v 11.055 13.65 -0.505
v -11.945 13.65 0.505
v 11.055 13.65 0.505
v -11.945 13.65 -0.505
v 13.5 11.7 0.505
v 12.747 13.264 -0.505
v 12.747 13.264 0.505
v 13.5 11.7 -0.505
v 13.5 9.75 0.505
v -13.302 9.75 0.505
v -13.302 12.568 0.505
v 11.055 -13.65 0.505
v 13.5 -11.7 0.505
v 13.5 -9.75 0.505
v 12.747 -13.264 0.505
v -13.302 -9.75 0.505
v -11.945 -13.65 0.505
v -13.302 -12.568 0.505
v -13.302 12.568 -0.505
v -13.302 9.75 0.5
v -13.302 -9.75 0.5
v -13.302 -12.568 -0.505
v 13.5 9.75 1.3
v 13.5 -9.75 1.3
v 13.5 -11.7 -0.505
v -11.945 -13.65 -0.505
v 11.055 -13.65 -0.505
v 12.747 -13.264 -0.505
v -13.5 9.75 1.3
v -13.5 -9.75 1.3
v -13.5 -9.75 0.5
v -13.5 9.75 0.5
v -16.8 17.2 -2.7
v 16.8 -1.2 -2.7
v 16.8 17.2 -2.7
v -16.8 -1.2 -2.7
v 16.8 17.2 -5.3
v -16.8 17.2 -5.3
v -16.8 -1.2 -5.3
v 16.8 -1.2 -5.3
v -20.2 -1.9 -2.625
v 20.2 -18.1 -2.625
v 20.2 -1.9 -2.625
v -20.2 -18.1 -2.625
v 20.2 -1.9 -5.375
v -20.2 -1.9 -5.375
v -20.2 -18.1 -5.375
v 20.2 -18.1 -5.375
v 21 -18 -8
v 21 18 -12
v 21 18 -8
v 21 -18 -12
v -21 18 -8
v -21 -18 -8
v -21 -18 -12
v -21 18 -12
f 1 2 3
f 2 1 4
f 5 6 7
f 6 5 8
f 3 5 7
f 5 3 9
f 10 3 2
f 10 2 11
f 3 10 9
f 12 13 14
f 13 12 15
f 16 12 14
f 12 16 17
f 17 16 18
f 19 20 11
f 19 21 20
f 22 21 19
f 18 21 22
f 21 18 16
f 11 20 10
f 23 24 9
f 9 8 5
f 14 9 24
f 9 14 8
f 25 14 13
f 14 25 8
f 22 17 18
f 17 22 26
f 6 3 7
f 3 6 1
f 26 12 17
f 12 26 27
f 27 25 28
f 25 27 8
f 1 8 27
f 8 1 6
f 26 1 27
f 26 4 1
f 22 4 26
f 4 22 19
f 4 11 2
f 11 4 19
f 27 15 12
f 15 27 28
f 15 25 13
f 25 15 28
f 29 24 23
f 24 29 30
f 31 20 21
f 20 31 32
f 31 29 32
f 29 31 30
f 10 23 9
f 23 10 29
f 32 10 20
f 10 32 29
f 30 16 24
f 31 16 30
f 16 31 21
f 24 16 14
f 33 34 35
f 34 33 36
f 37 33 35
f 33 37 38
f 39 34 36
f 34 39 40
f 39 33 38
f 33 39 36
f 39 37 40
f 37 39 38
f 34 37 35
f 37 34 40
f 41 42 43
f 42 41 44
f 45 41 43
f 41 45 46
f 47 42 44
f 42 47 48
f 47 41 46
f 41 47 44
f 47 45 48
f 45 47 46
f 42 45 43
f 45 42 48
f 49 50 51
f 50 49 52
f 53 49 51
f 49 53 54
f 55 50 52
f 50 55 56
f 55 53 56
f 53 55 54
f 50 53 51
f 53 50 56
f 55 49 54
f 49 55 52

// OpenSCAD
// file: charger.scad
module charger() {
    color("Steelblue") cube([19.2,25.1,2.7], center=true); //Bord
    //color("Silver") translate([0,9,1.25]) cube([7.6,9.2,5.2], center=true); //USB Plug
}
charger();
// file: bluetooth.scad
module bluetooth() {
    color("DarkSlateGray") cube([16.2,40.4,2.75], center=true);
}
// file: arduino.scad
module arduino() {
    color("Steelblue") cube([18.4,33.6,2.6], center=true);
}
// file: battery.scad
module battery()
    color("silver") cube([42,36,4], true);
    
battery();
// file: button.scad
module button() {
    color("red") difference() {
        union() {
            cube([9,8,2], center=true);
            translate([0,0,-1]) cube([10,9,1], center=true);
        }
        translate([0,0,-0.8]) cube([8,7,3], center=true);
    }
}
rotate([180,0,0]) button();
// file: oled.scad
module oled() {
    color("Steelblue", 1) minkowski() {
        cube([23,23.4,1], center=true);
        cylinder(r=2,h=0.01, center=true);
    }
    color("Grey", 1) translate([0,0,0.9]) cube([27,19.5,0.8], center=true);
}
// main file
use <oled.scad>;
use <button.scad>;
use <battery.scad>;
use <arduino.scad>;
use <bluetooth.scad>;
use <charger.scad>;

module electronics() {
    oled();
    translate([0,8,-4]) rotate([0,0,90]) arduino();
    translate([0,-10,-4]) rotate([0,0,90]) bluetooth();
    //translate([-10,10,6]) charger();
    translate([0,0,-10]) battery();
}

electronics();
